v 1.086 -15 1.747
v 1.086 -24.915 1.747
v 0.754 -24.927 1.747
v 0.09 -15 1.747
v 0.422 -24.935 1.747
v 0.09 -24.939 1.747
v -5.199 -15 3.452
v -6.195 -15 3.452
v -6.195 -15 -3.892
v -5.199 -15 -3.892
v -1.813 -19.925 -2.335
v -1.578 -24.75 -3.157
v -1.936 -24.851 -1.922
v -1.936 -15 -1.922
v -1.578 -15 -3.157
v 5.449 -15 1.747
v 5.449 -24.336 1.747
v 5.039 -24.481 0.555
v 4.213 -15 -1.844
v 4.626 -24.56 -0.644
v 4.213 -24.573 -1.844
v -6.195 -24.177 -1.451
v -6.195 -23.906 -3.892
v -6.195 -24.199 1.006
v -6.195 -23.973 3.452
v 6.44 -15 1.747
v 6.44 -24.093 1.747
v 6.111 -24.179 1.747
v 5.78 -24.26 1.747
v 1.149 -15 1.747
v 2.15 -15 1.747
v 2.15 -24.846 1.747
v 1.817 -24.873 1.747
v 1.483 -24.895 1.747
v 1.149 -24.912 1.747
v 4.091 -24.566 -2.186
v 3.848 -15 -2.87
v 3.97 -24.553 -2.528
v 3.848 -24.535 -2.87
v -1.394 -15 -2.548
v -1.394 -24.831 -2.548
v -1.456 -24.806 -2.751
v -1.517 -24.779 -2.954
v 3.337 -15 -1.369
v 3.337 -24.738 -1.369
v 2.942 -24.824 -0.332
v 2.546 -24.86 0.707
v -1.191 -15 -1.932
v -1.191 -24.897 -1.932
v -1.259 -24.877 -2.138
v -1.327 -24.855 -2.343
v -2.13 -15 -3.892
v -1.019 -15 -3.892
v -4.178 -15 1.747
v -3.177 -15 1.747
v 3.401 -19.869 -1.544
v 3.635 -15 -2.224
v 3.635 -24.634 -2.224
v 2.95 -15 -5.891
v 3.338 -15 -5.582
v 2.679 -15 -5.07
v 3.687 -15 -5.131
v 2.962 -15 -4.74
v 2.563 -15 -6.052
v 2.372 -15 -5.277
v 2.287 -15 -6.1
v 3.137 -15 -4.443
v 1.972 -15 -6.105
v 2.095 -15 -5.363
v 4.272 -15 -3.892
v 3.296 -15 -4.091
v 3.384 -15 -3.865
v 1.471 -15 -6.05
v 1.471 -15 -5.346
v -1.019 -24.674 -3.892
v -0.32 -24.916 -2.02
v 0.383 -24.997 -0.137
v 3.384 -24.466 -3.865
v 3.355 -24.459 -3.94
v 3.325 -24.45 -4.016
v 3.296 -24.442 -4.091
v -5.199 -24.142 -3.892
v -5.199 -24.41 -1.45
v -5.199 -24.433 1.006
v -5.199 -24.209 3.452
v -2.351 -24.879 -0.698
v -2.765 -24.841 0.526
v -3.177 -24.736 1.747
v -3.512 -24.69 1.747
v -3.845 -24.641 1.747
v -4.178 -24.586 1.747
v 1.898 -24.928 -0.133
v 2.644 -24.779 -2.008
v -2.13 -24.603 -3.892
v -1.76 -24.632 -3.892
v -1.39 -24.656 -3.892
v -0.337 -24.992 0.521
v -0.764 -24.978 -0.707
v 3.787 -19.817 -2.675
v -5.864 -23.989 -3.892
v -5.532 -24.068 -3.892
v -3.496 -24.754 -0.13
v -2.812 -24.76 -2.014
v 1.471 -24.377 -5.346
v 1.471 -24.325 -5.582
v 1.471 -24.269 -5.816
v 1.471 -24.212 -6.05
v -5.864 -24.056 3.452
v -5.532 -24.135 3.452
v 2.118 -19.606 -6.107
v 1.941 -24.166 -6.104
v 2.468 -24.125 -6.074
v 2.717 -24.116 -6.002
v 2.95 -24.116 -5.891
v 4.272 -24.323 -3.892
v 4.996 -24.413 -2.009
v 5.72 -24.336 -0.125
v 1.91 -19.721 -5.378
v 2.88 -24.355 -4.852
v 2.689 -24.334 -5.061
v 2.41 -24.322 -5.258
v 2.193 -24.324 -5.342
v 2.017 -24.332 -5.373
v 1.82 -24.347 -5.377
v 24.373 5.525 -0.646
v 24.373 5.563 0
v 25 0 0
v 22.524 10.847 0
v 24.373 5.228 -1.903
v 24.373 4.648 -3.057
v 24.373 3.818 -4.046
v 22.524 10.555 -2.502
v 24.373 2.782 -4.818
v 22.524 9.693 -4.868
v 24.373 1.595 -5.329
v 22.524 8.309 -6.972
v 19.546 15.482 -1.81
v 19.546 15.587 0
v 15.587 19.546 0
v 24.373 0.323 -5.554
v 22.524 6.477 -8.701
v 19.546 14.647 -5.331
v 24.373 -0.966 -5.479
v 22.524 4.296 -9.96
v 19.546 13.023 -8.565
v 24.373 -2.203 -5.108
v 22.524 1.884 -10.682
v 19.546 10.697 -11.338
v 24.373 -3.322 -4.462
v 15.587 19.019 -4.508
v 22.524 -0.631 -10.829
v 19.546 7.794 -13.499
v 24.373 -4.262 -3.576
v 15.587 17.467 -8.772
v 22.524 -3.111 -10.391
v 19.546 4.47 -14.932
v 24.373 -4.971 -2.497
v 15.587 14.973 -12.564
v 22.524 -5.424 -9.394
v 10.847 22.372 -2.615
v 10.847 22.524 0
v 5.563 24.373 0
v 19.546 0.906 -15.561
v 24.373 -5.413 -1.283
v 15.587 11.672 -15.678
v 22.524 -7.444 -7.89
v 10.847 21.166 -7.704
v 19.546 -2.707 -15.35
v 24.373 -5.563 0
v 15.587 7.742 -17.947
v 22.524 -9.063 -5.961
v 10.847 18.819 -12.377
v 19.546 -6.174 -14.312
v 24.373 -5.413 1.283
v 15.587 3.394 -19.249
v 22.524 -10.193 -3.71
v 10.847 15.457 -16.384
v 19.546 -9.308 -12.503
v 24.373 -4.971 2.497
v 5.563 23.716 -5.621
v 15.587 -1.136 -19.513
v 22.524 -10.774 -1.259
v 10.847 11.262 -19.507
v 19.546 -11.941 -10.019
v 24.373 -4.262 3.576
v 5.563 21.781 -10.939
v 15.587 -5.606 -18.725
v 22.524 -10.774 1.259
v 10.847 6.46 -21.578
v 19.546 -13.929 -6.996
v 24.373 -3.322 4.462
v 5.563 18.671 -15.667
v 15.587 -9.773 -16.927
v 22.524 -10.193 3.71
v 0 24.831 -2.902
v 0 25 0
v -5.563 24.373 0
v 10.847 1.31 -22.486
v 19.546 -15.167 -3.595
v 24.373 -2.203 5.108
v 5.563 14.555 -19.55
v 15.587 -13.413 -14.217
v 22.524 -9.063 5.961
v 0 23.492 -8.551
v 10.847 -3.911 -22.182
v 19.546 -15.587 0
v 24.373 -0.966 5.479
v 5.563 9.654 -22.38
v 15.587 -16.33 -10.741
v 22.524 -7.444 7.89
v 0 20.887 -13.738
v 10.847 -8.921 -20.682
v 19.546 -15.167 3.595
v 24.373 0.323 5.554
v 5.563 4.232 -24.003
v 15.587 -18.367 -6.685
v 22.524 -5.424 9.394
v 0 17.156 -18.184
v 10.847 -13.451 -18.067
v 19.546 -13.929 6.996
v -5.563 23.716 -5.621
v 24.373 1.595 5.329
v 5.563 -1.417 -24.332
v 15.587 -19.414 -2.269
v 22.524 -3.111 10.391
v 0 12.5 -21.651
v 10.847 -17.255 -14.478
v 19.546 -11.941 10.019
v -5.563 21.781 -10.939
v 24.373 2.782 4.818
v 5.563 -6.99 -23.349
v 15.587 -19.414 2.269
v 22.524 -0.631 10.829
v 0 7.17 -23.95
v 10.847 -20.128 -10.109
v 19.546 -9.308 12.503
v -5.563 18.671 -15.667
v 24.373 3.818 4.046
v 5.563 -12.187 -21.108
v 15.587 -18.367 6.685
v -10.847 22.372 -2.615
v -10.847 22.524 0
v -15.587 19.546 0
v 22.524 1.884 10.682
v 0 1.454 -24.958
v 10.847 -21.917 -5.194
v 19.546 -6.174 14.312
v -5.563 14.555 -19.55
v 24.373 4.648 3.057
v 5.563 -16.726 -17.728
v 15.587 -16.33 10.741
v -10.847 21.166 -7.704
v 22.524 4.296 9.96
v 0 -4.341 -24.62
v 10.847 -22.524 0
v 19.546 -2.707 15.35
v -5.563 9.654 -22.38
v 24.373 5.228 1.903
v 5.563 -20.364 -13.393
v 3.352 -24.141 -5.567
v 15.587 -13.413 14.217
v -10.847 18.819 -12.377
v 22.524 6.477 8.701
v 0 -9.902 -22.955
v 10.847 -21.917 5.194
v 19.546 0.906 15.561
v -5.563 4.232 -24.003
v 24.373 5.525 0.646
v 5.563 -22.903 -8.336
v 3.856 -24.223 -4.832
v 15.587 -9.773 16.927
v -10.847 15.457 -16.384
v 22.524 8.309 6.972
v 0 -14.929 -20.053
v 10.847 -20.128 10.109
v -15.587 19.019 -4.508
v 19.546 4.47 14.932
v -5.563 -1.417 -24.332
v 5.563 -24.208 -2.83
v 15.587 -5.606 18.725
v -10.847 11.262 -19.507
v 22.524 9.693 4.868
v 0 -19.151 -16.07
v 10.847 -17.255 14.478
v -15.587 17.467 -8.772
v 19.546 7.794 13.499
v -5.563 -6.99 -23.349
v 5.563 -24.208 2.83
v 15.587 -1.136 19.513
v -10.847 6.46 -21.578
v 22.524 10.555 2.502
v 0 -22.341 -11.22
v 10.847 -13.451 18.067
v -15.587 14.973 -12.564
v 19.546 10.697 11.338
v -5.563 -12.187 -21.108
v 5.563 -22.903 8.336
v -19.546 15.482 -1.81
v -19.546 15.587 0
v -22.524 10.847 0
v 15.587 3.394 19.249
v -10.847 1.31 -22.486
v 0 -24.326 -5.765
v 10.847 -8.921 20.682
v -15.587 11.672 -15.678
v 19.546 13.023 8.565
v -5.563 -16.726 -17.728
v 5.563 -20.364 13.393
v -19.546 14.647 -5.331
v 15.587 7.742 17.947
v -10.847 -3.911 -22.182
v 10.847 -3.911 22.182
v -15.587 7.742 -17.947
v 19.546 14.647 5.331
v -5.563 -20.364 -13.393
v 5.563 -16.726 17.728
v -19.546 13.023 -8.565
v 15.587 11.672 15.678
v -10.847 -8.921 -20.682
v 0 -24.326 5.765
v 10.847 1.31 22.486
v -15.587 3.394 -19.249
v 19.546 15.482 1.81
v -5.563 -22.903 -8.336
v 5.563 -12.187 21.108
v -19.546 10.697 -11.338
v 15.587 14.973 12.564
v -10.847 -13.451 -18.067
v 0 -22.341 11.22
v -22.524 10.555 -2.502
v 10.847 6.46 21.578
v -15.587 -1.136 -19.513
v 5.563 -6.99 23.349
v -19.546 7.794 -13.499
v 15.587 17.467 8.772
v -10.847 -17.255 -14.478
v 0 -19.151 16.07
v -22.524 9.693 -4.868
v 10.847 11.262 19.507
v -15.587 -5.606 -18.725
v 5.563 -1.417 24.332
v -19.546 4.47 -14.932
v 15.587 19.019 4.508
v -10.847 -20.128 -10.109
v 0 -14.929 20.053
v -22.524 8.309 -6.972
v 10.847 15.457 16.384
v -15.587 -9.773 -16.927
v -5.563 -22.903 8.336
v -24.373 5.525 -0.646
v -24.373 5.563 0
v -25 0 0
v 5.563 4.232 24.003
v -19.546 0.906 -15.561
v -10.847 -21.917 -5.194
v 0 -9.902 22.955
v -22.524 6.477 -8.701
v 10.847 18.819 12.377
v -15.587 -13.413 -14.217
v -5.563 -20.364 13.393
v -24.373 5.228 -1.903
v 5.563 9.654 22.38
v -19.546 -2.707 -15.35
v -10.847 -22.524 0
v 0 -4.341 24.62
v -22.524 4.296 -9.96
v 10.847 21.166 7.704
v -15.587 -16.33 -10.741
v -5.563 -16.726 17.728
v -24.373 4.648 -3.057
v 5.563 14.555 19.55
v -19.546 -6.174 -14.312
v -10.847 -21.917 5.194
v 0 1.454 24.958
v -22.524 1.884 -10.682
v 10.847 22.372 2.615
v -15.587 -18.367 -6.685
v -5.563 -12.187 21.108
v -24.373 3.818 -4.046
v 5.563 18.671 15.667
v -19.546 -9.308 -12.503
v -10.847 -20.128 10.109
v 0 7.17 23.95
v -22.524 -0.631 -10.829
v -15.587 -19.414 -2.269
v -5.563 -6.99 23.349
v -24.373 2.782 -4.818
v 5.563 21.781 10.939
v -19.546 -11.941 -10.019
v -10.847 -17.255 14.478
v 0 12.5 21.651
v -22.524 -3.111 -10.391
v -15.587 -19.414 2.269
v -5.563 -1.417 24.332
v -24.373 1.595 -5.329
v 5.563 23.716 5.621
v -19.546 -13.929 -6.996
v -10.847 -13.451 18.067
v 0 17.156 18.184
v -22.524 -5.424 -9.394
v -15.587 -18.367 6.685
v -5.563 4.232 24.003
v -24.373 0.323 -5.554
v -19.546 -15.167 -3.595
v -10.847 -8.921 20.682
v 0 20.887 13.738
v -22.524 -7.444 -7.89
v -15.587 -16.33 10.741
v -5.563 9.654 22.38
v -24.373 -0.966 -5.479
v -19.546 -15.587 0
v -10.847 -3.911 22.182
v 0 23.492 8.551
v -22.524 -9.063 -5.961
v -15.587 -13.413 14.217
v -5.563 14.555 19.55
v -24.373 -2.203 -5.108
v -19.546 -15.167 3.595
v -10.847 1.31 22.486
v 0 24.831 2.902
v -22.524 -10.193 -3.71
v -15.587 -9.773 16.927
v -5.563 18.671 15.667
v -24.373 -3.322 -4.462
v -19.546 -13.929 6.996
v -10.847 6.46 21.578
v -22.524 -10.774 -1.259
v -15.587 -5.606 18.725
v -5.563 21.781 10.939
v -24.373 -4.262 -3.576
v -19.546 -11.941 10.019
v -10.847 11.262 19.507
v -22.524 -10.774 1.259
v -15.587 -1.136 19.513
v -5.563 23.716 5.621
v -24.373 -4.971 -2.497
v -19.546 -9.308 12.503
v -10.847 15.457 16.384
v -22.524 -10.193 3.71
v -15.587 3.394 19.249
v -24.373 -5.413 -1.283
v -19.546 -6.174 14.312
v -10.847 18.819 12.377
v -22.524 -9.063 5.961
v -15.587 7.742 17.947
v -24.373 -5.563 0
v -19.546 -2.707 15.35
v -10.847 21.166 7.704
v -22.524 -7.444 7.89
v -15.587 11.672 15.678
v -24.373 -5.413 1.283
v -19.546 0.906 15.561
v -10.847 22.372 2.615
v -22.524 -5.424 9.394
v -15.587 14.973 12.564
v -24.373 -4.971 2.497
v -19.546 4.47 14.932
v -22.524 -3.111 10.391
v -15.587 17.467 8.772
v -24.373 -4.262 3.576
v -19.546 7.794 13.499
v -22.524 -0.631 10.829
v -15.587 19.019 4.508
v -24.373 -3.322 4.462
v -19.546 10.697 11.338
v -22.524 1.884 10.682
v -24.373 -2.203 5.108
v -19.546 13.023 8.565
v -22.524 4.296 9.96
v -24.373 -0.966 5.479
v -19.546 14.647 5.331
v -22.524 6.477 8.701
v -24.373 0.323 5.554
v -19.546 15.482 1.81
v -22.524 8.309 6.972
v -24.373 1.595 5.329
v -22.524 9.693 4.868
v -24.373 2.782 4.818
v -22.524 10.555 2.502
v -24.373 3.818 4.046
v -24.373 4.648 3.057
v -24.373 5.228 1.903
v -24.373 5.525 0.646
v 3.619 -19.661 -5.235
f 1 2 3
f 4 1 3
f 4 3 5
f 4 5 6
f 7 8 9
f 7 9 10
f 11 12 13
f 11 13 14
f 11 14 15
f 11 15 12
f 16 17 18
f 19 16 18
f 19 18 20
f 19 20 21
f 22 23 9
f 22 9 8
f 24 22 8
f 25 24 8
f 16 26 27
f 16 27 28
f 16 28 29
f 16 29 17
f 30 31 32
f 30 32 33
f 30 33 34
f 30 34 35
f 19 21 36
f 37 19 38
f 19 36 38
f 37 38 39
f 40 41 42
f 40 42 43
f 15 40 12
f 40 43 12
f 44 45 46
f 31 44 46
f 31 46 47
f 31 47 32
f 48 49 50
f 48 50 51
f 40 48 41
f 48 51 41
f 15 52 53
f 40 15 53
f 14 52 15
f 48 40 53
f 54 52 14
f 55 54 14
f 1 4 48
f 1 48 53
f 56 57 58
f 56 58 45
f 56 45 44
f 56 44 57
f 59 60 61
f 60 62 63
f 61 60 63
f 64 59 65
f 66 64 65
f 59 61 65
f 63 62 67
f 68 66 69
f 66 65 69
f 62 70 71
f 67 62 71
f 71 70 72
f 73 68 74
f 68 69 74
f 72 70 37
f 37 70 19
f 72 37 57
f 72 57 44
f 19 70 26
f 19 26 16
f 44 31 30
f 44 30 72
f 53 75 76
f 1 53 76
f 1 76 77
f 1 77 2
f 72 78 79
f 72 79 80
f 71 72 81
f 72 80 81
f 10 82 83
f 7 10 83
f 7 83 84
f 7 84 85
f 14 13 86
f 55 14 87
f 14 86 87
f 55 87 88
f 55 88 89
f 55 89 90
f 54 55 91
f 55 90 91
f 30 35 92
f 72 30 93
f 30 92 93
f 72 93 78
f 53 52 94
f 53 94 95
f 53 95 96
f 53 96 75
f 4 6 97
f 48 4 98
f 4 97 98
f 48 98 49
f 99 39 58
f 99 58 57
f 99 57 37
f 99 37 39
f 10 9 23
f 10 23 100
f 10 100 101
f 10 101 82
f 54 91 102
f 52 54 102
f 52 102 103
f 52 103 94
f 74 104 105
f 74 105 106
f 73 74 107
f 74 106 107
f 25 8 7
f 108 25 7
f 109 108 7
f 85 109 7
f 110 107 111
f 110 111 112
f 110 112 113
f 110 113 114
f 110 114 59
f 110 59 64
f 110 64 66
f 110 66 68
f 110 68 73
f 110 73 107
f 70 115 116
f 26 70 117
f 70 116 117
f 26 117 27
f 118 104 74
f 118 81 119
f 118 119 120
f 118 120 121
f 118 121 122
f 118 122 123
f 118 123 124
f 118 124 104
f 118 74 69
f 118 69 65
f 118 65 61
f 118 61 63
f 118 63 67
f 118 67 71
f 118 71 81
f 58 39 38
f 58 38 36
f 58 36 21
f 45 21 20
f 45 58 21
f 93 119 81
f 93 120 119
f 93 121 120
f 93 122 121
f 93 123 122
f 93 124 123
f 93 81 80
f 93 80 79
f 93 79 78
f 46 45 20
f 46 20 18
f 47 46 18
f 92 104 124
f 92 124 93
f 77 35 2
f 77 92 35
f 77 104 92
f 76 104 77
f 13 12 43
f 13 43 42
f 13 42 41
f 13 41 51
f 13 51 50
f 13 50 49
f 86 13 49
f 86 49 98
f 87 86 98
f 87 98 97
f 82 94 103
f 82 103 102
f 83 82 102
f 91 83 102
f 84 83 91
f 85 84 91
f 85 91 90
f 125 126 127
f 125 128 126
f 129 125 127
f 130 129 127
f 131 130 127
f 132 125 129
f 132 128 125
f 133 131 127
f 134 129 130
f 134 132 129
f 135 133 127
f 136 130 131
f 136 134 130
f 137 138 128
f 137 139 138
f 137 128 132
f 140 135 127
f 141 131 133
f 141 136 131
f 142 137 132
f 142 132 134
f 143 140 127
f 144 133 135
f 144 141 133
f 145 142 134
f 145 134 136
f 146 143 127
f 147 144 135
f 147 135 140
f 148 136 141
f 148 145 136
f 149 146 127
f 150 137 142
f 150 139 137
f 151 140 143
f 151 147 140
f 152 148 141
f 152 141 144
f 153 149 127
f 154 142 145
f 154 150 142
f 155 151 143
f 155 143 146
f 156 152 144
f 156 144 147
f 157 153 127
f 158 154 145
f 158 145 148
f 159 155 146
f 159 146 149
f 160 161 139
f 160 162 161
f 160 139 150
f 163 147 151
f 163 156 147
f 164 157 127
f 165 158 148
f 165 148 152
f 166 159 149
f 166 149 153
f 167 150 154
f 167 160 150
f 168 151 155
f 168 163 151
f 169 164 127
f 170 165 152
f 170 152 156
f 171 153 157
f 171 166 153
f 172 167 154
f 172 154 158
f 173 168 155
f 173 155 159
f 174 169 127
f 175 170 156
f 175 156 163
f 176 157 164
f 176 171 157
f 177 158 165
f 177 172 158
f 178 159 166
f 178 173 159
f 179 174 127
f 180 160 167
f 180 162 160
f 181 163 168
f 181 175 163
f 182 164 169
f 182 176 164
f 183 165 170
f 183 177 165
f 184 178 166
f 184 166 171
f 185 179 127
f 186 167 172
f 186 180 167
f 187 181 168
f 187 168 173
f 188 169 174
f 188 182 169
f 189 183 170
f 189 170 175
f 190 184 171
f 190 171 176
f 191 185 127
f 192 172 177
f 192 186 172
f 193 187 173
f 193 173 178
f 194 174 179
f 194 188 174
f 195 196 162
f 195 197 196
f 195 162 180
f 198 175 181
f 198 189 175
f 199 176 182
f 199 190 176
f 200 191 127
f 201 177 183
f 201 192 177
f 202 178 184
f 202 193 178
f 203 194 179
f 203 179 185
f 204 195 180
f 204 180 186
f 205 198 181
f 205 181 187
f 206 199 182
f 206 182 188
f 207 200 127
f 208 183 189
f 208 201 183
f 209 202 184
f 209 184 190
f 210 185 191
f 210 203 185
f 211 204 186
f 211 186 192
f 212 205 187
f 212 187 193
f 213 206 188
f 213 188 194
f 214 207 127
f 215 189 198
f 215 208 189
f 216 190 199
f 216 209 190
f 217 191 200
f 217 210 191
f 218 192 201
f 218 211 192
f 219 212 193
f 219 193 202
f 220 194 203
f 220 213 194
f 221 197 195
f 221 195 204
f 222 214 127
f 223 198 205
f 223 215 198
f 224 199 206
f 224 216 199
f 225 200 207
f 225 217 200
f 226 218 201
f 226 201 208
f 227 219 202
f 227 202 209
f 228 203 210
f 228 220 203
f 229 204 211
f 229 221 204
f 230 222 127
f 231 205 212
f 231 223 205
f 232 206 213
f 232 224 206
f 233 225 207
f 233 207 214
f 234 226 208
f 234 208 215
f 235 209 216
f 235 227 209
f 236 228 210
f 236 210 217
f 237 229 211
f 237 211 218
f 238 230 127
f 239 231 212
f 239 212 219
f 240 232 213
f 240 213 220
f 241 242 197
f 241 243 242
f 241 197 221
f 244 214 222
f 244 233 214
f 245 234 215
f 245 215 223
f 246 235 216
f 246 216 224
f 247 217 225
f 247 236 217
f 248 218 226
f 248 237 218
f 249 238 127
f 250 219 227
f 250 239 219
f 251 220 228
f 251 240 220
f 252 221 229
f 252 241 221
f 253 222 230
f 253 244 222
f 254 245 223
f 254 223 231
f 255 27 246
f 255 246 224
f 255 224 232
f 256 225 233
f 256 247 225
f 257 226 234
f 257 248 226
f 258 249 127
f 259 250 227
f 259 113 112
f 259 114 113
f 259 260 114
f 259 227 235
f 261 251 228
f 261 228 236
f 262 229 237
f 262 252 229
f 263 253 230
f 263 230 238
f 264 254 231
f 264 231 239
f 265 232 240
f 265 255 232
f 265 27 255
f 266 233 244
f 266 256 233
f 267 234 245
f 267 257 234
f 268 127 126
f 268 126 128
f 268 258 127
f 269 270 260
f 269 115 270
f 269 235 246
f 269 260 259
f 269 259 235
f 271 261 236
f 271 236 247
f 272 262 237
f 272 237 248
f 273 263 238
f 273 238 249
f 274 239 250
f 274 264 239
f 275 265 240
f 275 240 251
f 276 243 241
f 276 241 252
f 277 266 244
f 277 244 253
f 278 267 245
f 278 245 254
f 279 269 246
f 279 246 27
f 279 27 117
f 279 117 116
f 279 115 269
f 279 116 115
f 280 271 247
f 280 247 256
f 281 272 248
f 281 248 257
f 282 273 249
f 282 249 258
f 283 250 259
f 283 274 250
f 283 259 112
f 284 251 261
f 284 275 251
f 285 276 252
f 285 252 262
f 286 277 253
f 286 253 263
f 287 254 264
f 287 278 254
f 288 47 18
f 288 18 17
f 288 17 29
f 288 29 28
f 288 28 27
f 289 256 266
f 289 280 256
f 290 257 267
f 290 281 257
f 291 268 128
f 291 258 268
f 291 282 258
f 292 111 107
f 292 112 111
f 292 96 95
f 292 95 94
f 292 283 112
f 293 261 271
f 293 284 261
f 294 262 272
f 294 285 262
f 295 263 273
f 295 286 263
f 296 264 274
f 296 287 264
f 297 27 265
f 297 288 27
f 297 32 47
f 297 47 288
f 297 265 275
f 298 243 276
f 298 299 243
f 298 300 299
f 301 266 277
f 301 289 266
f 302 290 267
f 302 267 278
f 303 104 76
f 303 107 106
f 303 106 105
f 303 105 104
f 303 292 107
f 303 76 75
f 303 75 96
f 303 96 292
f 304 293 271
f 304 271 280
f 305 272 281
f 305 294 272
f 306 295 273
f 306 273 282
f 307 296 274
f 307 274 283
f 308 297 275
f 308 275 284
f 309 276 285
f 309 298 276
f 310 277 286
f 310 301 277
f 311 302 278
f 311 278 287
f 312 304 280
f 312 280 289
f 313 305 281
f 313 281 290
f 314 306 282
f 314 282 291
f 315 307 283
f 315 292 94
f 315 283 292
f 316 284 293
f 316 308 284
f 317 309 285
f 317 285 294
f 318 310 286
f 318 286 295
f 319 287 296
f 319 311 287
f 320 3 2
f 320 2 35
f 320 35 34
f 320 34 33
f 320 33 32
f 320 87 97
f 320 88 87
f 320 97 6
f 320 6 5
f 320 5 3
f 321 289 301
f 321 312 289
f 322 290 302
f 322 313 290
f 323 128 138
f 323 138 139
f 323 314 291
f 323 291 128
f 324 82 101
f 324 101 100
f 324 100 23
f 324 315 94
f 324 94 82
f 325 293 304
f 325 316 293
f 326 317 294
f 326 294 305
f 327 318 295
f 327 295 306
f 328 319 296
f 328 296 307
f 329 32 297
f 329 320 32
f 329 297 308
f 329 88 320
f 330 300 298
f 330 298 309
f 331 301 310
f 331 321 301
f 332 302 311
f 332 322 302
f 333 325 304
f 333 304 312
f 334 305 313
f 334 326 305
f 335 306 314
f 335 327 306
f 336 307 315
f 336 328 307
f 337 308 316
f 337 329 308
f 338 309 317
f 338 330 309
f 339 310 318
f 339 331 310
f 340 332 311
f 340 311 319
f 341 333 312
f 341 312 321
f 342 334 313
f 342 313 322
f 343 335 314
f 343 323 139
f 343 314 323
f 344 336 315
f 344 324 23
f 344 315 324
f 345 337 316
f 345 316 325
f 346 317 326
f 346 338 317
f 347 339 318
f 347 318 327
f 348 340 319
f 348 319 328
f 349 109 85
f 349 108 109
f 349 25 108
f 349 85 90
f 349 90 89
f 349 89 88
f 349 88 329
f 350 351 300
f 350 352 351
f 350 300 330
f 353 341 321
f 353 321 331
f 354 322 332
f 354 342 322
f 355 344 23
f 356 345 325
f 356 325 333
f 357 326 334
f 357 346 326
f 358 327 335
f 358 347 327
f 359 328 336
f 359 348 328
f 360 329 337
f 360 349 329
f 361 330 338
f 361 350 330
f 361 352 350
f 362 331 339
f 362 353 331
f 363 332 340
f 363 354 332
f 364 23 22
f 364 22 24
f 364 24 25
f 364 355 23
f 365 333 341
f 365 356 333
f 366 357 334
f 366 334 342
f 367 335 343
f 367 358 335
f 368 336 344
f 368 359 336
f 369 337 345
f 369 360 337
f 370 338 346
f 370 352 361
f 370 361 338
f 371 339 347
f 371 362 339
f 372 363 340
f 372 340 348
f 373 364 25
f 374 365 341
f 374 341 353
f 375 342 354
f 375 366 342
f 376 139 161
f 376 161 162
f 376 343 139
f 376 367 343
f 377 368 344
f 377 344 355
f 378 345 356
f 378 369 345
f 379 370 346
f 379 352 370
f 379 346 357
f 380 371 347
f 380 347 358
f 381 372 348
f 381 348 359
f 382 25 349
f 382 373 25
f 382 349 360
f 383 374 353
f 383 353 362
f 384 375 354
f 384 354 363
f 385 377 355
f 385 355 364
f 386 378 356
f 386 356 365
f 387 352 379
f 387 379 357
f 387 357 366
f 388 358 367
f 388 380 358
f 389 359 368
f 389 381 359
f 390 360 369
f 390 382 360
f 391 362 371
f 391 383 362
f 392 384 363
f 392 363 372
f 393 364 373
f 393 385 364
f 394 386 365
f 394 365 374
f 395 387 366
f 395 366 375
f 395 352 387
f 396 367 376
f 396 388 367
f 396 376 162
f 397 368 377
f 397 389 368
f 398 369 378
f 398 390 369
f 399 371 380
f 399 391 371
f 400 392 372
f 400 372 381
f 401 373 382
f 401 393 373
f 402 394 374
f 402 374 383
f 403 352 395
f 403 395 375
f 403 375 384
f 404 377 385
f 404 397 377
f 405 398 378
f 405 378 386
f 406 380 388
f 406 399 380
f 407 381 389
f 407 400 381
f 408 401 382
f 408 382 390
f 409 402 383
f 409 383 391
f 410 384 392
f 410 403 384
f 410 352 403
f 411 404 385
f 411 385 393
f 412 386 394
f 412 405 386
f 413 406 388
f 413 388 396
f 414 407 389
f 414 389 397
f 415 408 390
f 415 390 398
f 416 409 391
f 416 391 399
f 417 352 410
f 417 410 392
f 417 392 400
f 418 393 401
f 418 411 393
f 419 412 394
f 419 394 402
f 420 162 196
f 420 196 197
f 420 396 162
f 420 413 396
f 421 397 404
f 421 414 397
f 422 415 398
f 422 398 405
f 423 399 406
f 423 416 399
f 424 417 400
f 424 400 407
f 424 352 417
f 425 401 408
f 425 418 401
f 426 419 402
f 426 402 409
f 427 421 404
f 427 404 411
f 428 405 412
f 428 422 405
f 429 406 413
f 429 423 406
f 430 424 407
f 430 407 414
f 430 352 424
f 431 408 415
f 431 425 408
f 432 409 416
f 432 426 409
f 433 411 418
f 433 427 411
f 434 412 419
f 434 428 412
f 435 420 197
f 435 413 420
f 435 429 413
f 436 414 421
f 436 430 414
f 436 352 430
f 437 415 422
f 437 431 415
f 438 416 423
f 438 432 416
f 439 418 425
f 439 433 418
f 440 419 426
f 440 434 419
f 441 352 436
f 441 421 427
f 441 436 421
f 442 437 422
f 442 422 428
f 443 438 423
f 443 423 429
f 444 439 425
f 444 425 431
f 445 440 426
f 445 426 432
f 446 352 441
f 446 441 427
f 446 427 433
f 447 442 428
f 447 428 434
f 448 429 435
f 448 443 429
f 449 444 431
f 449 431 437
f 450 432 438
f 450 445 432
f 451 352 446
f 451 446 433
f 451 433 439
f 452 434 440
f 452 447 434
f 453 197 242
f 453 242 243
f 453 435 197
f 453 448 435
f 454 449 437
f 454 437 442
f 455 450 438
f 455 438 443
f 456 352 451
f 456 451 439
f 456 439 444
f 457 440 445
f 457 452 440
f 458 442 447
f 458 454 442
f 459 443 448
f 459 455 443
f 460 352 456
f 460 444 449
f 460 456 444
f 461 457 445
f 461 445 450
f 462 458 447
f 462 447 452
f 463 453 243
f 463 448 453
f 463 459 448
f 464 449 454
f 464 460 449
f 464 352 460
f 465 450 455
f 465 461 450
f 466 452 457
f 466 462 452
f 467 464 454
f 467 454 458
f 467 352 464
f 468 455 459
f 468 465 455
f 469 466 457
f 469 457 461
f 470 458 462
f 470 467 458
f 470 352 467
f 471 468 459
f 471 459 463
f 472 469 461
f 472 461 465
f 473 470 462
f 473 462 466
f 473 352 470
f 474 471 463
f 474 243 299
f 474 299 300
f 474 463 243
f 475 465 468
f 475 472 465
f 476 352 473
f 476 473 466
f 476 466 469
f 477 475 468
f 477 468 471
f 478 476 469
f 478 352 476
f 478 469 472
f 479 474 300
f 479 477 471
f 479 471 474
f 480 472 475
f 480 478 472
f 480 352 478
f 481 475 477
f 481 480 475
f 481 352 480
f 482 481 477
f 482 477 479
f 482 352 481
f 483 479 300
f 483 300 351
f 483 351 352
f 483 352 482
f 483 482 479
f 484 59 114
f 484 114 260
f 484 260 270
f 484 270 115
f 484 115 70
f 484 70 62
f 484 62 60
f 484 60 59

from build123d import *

# Parameters (mm, degrees)
F4_DEPTH = 10
F3_W     = 0.9957388944
F3_H     = 7.3437828345
F5_DEPTH = 10
F6_DEPTH = 10


with BuildPart() as f1:
    # F0 (on Top) → F1 (revolve)
    with BuildSketch(Plane.XY):
        with BuildLine():
            Line((-25, 0), (25, 0))
            ThreePointArc((25, 0), (0, 25), (-25, 0))
        make_face()
    revolve(axis=Axis((0, 0, 0), (-1, 0, 0)))

    # F3 (on offset) → F4 (cut)
    with BuildSketch(Plane.XZ.offset(25)):
        with BuildLine():
            Line((-2.1299138496, -3.89204987), (-1.0190895553, -3.89204987))
            Line((-1.0190895553, -3.89204987), (1.0858057291, 1.7471347231))
            Line((1.0858057291, 1.7471347231), (0.0900668347, 1.7471347231))
            Line((0.0900668347, 1.7471347231), (-1.1908837029, -1.9322622637))
            Line((-1.1908837029, -1.9322622637), (-1.3943680331, -2.5477189673))
            Line((-1.3943680331, -2.5477189673), (-1.5778375111, -3.1565040535))
            add(Edge.make_bspline(
                [(-1.9364369455, -1.9222548377), (-1.8697207716, -2.1307428809), (-1.5778375111, -3.1565040535)],
                knots=[0, 0, 0, 1, 1, 1], degree=2))
            Line((-1.9364369455, -1.9222548377), (-3.1773577787, 1.7471347231))
            Line((-3.1773577787, 1.7471347231), (-4.1781003862, 1.7471347231))
            Line((-4.1781003862, 1.7471347231), (-2.1299138496, -3.89204987))
        make_face()
    extrude(amount=-F4_DEPTH, mode=Mode.SUBTRACT)

    # F3 (on offset) → F5 (cut)
    with BuildSketch(Plane.XZ.offset(25)):
        with Locations((-5.6967272931, -0.2201584528)):
            Rectangle(F3_W, F3_H)
    extrude(amount=-F5_DEPTH, mode=Mode.SUBTRACT)

    # F3 (on offset) → F6 (cut)
    with BuildSketch(Plane.XZ.offset(25)):
        with BuildLine():
            add(Edge.make_bspline(
                [(2.1182385192, -6.1070268413), (1.7329526153, -6.1070268413), (1.471091633, -6.0503180935)],
                knots=[0, 0, 0, 1, 1, 1], degree=2))
            add(Edge.make_bspline(
                [(2.9496888355, -5.8910332285), (2.5819159273, -6.1070268413), (2.1182385192, -6.1070268413)],
                knots=[0, 0, 0, 1, 1, 1], degree=2))
            add(Edge.make_bspline(
                [(3.6193524304, -5.2347128684), (3.3174617438, -5.6750396157), (2.9496888355, -5.8910332285)],
                knots=[0, 0, 0, 1, 1, 1], degree=2))
            add(Edge.make_bspline(
                [(4.2715030296, -3.89204987), (3.921243117, -4.7943861211), (3.6193524304, -5.2347128684)],
                knots=[0, 0, 0, 1, 1, 1], degree=2))
            Line((4.2715030296, -3.89204987), (6.4397786791, 1.7471347231))
            Line((6.4397786791, 1.7471347231), (5.4490434977, 1.7471347231))
            Line((5.4490434977, 1.7471347231), (4.2131263775, -1.8438633334))
            Line((4.2131263775, -1.8438633334), (3.8478553258, -2.8696245061))
            add(Edge.make_bspline(
                [(3.6351975217, -2.2241455242), (3.8328441866, -2.8029083322), (3.8478553258, -2.8696245061)],
                knots=[0, 0, 0, 1, 1, 1], degree=2))
            add(Edge.make_bspline(
                [(3.4008569611, -1.5436405512), (3.4375508567, -1.6453827163), (3.6351975217, -2.2241455242)],
                knots=[0, 0, 0, 1, 1, 1], degree=2))
            add(Edge.make_bspline(
                [(3.3374765959, -1.3685105949), (3.3641630655, -1.4418983861), (3.4008569611, -1.5436405512)],
                knots=[0, 0, 0, 1, 1, 1], degree=2))
            Line((3.3374765959, -1.3685105949), (2.1499287017, 1.7471347231))
            Line((2.1499287017, 1.7471347231), (1.1491860943, 1.7471347231))
            Line((1.1491860943, 1.7471347231), (3.3841779176, -3.8653634005))
            Line((3.3841779176, -3.8653634005), (3.2957789873, -4.0905304872))
            add(Edge.make_bspline(
                [(1.9097504759, -5.3781526422), (2.7854002575, -5.3781526422), (3.2957789873, -4.0905304872)],
                knots=[0, 0, 0, 1, 1, 1], degree=2))
            add(Edge.make_bspline(
                [(1.471091633, -5.3464624596), (1.6695722501, -5.3781526422), (1.9097504759, -5.3781526422)],
                knots=[0, 0, 0, 1, 1, 1], degree=2))
            Line((1.471091633, -5.3464624596), (1.471091633, -6.0503180935))
        make_face()
    extrude(amount=-F6_DEPTH, mode=Mode.SUBTRACT)


solid = f1.part
